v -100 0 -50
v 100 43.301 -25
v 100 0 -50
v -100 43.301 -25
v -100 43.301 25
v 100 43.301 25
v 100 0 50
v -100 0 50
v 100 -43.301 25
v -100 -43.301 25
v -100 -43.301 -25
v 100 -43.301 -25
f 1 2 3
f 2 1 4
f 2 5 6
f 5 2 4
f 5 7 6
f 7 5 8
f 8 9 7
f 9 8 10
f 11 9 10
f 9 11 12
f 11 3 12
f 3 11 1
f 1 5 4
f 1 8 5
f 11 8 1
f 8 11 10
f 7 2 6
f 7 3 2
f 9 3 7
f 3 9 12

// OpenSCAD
color("orange")
	rotate([0,90,0])
		cylinder(r=50, h=200, center=true, $fn=6);
		
